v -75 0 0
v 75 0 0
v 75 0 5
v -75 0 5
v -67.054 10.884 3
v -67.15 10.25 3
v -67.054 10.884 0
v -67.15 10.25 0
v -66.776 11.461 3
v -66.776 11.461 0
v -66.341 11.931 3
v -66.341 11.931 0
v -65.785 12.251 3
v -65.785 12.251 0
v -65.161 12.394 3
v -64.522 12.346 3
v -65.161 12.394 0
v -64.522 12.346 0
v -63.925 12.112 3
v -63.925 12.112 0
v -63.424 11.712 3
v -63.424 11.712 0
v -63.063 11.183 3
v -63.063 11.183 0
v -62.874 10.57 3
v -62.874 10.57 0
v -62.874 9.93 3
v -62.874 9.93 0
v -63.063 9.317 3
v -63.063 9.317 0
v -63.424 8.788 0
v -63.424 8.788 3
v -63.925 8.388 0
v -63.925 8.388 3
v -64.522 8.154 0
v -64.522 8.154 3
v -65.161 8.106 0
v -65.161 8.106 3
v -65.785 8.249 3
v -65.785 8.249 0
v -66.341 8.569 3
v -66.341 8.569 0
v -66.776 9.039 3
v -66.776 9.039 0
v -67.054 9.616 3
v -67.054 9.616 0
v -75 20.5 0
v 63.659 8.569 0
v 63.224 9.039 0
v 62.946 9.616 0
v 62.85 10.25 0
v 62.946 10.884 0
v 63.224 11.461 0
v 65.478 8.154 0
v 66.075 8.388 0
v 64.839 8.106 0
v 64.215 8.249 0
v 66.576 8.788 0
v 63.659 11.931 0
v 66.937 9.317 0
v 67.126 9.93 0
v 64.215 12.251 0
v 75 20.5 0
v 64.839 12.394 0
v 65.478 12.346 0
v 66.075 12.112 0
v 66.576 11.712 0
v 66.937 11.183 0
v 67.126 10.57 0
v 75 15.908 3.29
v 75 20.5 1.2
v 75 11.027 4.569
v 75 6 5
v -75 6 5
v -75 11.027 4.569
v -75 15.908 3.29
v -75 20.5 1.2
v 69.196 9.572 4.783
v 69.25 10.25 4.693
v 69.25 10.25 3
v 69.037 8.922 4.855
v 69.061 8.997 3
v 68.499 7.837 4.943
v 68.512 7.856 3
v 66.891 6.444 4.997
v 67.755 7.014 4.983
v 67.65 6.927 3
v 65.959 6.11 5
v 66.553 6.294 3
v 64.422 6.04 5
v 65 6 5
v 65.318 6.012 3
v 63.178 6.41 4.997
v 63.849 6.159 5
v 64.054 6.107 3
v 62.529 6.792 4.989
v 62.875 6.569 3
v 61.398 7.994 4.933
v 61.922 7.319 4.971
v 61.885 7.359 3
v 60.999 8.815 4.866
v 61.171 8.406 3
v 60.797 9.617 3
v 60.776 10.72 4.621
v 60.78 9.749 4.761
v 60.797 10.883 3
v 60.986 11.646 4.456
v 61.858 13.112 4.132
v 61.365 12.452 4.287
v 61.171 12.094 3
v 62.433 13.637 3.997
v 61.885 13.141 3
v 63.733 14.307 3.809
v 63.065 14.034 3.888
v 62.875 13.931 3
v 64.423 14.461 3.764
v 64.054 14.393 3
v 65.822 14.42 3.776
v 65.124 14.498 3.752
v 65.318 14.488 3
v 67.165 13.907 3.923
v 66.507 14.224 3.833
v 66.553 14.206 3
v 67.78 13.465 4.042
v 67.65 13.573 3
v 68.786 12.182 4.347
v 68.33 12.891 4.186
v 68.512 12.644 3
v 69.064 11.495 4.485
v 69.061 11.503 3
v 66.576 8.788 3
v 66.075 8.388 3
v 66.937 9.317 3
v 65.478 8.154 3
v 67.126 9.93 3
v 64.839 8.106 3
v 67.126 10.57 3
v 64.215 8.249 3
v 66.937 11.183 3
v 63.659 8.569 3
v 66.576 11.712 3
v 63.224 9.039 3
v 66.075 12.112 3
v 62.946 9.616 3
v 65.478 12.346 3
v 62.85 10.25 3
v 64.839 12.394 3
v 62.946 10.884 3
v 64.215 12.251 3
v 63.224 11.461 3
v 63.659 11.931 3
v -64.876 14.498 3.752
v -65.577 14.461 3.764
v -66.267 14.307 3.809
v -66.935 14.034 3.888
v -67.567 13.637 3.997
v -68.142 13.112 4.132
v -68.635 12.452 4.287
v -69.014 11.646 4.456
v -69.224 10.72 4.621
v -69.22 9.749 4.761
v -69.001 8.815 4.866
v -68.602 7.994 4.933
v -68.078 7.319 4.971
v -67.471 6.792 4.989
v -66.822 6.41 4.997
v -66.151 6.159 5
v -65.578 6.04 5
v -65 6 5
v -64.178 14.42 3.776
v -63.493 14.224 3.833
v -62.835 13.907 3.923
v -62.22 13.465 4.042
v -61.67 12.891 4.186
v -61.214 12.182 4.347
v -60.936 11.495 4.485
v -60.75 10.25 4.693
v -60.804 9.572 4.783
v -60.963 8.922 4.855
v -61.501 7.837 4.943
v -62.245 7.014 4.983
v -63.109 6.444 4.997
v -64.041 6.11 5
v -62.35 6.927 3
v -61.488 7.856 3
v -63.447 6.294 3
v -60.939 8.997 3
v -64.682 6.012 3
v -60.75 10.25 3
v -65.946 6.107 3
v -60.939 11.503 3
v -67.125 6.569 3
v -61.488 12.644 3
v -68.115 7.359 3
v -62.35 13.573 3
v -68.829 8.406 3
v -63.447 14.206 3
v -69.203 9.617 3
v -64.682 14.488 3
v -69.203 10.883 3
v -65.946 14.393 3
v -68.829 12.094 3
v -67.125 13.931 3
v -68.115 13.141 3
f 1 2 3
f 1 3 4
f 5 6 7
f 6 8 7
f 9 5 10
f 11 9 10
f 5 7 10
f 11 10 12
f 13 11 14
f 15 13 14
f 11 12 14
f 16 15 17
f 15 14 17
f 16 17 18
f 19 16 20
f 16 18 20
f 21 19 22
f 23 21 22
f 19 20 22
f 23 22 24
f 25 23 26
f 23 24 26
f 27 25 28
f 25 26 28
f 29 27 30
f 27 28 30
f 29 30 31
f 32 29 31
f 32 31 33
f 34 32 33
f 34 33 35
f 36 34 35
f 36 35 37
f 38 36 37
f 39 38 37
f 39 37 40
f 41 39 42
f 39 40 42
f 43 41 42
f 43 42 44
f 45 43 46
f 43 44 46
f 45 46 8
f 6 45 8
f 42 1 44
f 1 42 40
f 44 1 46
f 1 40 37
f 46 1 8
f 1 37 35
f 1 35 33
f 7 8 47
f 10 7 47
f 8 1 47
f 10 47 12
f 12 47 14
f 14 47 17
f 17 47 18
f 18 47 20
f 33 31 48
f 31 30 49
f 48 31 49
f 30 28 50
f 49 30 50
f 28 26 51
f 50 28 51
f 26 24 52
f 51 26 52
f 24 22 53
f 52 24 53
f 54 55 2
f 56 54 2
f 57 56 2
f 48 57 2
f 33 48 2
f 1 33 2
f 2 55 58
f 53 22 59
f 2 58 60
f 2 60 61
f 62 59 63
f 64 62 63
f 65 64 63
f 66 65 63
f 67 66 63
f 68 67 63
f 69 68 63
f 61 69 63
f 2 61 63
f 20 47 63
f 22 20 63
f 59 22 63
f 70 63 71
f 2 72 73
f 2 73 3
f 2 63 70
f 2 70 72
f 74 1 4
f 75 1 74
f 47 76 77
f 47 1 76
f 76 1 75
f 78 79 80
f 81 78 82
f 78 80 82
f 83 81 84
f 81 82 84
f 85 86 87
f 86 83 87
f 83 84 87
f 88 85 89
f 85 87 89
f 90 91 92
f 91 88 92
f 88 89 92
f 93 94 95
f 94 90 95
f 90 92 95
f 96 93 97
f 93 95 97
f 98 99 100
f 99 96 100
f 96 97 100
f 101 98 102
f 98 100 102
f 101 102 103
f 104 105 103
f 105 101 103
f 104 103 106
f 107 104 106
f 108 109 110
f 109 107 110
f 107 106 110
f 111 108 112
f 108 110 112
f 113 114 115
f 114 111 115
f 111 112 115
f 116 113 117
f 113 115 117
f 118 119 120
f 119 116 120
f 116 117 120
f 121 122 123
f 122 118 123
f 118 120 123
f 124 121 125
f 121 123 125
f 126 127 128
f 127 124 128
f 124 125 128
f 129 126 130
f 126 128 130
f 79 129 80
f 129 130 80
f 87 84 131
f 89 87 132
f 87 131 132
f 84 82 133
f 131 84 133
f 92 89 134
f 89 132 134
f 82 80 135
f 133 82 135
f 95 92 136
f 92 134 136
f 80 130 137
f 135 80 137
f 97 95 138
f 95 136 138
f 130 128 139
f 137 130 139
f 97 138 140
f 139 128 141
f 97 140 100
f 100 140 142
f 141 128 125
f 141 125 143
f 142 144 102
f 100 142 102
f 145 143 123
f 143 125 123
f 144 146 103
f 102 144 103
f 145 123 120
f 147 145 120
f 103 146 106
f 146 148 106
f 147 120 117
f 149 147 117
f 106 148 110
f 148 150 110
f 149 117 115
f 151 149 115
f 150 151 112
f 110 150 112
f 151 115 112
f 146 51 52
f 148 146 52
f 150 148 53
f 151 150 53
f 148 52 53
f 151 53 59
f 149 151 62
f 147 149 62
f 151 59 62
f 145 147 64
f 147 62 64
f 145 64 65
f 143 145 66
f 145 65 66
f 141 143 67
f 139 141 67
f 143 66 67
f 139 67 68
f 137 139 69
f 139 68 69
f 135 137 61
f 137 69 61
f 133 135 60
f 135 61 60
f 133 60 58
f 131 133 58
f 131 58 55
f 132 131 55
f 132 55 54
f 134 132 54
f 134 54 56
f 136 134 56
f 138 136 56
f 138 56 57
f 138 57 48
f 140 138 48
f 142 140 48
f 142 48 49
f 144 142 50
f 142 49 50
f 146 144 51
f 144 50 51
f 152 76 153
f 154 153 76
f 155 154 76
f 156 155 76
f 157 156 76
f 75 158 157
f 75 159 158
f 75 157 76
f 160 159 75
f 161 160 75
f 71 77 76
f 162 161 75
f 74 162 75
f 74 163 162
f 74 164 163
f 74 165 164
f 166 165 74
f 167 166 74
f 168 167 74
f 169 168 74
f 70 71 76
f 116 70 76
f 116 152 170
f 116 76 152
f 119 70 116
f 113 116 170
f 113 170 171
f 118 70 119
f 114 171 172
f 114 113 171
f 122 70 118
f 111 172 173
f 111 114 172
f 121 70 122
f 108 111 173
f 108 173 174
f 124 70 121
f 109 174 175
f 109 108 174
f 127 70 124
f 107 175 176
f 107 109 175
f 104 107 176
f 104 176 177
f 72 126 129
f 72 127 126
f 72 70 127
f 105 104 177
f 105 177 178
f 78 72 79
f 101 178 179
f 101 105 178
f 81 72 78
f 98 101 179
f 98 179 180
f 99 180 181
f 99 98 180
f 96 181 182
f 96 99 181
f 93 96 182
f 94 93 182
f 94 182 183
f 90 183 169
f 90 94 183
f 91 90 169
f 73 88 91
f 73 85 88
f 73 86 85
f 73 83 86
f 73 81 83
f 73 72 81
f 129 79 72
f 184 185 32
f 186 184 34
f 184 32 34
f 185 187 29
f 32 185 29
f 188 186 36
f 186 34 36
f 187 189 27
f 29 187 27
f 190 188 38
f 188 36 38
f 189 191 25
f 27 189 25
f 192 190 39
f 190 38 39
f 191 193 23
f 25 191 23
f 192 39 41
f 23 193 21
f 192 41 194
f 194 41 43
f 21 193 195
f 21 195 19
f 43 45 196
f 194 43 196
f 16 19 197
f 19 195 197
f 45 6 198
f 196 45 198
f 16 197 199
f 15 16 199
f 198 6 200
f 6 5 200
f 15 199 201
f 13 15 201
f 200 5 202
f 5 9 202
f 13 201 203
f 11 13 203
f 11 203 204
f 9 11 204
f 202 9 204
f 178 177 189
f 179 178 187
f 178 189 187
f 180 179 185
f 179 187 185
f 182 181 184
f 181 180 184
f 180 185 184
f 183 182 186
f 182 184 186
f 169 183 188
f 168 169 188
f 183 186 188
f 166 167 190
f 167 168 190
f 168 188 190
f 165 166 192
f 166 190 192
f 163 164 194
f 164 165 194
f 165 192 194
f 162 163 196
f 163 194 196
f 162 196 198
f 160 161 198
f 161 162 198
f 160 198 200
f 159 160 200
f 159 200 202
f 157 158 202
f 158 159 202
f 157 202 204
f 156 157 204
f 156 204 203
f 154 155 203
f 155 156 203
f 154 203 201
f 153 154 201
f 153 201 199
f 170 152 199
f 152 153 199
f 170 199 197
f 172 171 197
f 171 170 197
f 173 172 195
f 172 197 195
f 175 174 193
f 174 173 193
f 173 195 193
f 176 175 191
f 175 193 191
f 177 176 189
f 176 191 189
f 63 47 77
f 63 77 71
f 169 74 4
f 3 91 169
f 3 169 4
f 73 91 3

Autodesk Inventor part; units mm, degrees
ref_plane "YZ Plane" through (0, 0, 0) normal (1, 0, 0) x (0, 1, 0)
ref_plane "XZ Plane" through (0, 0, 0) normal (0, 1, 0) x (-1, 0, 0)
ref_plane "XY Plane" through (0, 0, 0) normal (0, 0, 1) x (1, 0, 0)
sketch "スケッチ1" plane through (0, 0, 0) normal (0, 0, 1) x (1, 0, 0)
  line L0 (-75, 20.5) -> (75, 20.5)
  line L1 (75, 20.5) -> (75, 0)
  line L2 (75, 0) -> (-75, 0)
  line L3 (-75, 0) -> (-75, 20.5)
  circle A0 centre (-65, 10.25) radius 4.25
  circle A1 centre (65, 10.25) radius 4.25
  point P0 (0, 0)
  point P1 (0, 0)
  dimension "d0" = 20.5
  dimension "d1" = 150
  dimension "d2" = 10.25
  dimension "d3" = 130
  dimension "d4" = 10
  dimension "d5" = 8.5
extrude "押し出し1" add sketch "スケッチ1" along normal blind 5
sketch "スケッチ3" plane through (75, 0, 0) normal (1, 0, 0) x (0, 0, -1)
  line L0 (0, 0) -> (0, 20.5) construction
  line L1 (0, 20.5) -> (-5, 20.5) construction
  line L2 (-5, 0) -> (-5, 20.5) construction
  line L3 (0, 0) -> (-5, 0) construction
  line L4 (0, 20.5) -> (-5, 20.5) projected
  arc A0 (-1.2, 20.5) -> (-5, 6) centre (24.5645, 6) ccw
  line L5 (-5, 0) -> (-5, 20.5) projected
  line L6 (-1.2, 20.5) -> (-5, 13.7479) construction
  line L7 (-1.2, 20.5) -> (-5, 20.5)
  line L8 (-5, 6) -> (-5, 20.5)
  point P0 (0, 0)
  dimension "d12" = 1.2
  dimension "d13" = 6
extrude "押し出し3" cut sketch "スケッチ3" against normal through all
sketch "スケッチ4" plane through (0, 0, 0) normal (0, 0, -1) x (-1, 0, 0)
  circle A0 centre (-65, 10.25) radius 4.25 projected
  circle A1 centre (65, 10.25) radius 4.25 projected
  circle A2 centre (-65, 10.25) radius 2.15
  circle A3 centre (65, 10.25) radius 2.15
  point P0 (0, 0)
  dimension "d16" = 4.3
extrude "押し出し4" add sketch "スケッチ4" against normal blind 3
equation "\"d2\" = 0.5 * d0"
equation "\"d4\" = -0.5 * d3 + 0.5 * d1"
properties part number "top_140mm_2"
